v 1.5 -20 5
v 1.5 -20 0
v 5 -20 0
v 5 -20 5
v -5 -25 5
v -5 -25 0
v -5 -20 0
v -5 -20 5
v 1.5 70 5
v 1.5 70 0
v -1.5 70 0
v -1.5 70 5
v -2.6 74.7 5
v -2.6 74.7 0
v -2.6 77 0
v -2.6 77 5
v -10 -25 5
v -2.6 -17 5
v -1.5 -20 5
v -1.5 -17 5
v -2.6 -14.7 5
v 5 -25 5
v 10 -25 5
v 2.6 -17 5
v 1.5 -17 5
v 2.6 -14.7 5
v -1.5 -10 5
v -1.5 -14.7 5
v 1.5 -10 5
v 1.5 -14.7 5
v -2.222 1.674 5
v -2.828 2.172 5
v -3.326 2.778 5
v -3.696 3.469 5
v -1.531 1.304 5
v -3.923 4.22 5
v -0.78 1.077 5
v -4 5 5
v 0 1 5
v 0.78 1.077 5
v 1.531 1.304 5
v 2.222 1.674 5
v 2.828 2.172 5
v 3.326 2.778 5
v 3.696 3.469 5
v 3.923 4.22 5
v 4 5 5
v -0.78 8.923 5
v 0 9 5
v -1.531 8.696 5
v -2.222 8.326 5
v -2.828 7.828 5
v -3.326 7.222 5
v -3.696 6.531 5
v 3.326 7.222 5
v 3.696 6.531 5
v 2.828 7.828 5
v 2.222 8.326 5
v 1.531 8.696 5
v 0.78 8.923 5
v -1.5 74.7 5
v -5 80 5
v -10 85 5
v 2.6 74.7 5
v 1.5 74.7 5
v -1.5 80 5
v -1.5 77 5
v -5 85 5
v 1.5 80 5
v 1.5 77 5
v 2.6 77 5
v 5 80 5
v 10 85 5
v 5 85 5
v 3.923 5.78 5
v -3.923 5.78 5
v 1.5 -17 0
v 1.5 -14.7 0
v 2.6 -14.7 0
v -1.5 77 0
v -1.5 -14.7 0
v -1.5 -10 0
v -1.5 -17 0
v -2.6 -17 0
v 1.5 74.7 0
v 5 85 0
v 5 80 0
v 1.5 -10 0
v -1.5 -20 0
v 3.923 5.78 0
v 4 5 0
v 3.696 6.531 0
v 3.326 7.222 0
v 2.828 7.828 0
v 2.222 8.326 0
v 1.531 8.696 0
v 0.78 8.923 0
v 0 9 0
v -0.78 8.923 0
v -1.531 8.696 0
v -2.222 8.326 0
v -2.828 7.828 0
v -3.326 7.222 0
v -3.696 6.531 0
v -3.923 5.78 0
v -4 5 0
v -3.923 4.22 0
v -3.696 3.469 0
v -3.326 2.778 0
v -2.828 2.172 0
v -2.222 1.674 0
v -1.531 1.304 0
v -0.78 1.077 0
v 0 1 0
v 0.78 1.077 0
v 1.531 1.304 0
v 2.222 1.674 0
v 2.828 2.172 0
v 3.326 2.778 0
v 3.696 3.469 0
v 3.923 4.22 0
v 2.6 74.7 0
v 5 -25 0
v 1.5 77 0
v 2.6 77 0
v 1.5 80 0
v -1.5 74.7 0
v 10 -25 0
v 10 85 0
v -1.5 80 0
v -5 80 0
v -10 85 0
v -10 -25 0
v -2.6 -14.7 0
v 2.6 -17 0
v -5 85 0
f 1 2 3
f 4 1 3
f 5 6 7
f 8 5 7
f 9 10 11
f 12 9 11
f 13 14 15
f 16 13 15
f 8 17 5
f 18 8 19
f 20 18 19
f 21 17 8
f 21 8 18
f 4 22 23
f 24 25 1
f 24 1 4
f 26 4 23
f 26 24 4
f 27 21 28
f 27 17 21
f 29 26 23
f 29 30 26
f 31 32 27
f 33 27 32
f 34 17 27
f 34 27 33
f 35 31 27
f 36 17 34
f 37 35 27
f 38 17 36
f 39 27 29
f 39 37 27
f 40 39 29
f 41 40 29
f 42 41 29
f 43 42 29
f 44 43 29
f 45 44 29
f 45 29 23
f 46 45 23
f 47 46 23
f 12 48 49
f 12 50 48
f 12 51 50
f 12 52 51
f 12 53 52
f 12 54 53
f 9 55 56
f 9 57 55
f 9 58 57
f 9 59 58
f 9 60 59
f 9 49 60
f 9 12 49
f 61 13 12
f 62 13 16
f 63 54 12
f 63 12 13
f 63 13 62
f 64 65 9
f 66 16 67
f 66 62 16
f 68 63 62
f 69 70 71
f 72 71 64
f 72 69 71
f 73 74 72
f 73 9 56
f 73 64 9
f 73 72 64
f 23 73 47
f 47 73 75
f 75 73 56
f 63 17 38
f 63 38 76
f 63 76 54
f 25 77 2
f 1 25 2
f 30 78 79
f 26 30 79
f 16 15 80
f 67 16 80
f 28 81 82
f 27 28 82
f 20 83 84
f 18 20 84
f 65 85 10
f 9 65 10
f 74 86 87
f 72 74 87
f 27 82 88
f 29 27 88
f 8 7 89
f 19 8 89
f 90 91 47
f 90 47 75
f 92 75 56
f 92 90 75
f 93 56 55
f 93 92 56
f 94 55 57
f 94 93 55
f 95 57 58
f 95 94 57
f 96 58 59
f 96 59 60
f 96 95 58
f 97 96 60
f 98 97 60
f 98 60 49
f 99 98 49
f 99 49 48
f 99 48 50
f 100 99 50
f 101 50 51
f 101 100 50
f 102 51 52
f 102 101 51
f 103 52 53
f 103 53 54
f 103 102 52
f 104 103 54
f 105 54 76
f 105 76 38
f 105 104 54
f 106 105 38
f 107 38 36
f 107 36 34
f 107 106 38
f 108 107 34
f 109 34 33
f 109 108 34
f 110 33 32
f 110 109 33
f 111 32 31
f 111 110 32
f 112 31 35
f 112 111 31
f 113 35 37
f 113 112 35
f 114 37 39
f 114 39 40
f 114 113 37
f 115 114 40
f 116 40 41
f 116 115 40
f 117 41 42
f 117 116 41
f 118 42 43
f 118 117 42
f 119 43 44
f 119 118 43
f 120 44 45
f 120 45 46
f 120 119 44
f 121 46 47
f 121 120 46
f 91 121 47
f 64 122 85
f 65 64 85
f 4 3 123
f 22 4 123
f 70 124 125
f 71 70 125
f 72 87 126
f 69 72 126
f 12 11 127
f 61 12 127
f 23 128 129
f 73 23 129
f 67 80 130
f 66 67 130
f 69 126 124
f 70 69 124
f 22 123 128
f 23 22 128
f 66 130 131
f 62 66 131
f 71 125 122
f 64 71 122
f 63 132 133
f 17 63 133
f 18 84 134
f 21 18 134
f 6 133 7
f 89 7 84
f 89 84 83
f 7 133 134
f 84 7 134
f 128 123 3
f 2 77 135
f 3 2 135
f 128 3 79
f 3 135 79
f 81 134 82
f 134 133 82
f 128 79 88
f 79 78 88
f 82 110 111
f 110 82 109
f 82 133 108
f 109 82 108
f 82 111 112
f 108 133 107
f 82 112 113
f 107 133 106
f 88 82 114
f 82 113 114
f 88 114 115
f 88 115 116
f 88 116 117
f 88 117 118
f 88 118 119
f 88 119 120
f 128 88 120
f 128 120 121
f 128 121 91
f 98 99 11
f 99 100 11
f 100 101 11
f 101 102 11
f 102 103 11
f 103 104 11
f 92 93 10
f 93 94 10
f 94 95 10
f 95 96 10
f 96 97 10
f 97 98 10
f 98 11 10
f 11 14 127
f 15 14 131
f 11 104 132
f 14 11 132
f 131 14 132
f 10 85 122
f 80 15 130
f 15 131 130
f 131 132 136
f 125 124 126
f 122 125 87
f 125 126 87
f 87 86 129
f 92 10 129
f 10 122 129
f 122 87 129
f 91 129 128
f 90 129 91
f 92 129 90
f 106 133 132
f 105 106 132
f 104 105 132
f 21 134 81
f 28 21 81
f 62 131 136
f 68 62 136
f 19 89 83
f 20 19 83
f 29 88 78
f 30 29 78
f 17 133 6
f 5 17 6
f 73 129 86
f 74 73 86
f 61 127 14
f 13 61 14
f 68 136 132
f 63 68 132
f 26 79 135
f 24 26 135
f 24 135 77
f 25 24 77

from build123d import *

# Parameters (mm, degrees)
SKETCH1_R           = 4
BOSS_EXTRUDE1_DEPTH = 5


with BuildPart() as part:
    # Sketch1 → Boss-Extrude1 (new body)
    with BuildSketch(Plane.XY):
        Polygon((-10, 80), (-10, -20), (-10, -25), (-5, -25), (-5, -20), (-1.5, -20), (-1.5, -17), (-2.6, -17), (-2.6, -14.7), (-1.5, -14.7), (-1.5, -10), (1.5, -10), (1.5, -14.7), (2.6, -14.7), (2.6, -17), (1.5, -17), (1.5, -20), (5, -20), (5, -25), (10, -25), (10, -20), (10, 80), (10, 85), (5, 85), (5, 80), (1.5, 80), (1.5, 77), (2.6, 77), (2.6, 74.7), (1.5, 74.7), (1.5, 70), (-1.5, 70), (-1.5, 74.7), (-2.6, 74.7), (-2.6, 77), (-1.5, 77), (-1.5, 80), (-5, 80), (-5, 85), (-10, 85), align=None)
        with Locations((0, 5)):
            Circle(SKETCH1_R, mode=Mode.SUBTRACT)
    extrude(amount=BOSS_EXTRUDE1_DEPTH)


solid = part.part
